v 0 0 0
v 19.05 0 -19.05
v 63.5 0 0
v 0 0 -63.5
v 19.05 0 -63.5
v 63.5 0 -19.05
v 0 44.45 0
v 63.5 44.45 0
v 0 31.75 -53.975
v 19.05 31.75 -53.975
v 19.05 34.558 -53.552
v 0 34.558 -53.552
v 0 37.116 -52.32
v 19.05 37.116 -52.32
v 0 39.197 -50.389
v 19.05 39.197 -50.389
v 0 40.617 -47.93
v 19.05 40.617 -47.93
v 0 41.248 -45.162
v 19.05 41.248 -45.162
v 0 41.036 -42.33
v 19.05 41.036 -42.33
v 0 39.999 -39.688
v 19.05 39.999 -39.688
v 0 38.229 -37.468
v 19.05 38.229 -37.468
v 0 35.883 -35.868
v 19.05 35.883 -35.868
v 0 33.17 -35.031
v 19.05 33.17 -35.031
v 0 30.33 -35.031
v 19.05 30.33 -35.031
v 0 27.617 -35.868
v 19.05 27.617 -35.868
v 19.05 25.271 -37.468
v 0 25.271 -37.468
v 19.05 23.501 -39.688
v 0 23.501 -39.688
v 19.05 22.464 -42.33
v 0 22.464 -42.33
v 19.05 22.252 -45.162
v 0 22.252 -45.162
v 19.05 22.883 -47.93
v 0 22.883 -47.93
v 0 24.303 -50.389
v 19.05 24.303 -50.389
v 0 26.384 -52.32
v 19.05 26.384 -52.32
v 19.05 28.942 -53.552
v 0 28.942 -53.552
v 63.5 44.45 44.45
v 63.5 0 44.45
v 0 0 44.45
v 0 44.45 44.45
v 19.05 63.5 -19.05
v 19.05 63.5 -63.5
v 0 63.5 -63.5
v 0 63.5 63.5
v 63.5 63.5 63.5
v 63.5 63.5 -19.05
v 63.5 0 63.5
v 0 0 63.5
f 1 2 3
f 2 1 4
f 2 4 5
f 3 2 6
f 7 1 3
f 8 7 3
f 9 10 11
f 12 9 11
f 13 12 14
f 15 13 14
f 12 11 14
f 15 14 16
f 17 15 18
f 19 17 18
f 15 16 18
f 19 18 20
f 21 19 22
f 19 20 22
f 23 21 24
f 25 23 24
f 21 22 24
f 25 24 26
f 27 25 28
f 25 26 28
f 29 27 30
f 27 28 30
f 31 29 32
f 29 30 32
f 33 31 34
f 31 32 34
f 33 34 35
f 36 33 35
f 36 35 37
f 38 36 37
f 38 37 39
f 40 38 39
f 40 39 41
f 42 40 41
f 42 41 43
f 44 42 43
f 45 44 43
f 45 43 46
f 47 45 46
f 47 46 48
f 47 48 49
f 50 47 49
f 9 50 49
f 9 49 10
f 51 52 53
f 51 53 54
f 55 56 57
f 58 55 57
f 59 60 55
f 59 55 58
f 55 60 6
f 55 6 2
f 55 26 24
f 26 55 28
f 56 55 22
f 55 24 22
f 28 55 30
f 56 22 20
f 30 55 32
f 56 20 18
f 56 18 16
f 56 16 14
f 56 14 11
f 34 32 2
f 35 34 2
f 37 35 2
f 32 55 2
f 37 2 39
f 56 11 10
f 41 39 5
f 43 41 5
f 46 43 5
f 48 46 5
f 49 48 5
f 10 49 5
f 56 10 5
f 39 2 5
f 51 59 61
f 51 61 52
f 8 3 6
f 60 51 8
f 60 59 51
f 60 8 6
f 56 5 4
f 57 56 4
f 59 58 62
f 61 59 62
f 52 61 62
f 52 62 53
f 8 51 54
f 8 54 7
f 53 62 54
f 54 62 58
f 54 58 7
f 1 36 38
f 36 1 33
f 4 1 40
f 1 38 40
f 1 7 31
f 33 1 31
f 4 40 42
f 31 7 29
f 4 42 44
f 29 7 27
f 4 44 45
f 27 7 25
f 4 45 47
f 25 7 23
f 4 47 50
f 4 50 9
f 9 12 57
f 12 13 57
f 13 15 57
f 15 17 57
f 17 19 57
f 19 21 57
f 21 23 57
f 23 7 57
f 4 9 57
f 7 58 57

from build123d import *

# Parameters (mm, degrees)
BOSS_EXTRUDE1_DEPTH = 63.5
BOSS_EXTRUDE2_DEPTH = 63.5
SKETCH6_R           = 9.525
CUT_EXTRUDE1_DEPTH  = 20.05


with BuildPart() as part:
    # Sketch3 → Boss-Extrude1 (new body)
    with BuildSketch(Plane(origin=(0, 0, 0), x_dir=(1, 0, 0), z_dir=(0, 1, 0))):
        Polygon((0, 0), (63.5, 0), (63.5, 19.05), (19.05, 19.05), (19.05, 63.5), (0, 63.5), align=None)
    extrude(amount=BOSS_EXTRUDE1_DEPTH)

    # Sketch5 → Boss-Extrude2 (add)
    with BuildSketch(Plane(origin=(63.5, 0, 0), x_dir=(0, 0, -1), z_dir=(1, 0, 0))):
        Polygon((0, 63.5), (-63.5, 63.5), (-63.5, 0), (-44.45, 0), (-44.45, 44.45), (0, 44.45), align=None)
    extrude(amount=-BOSS_EXTRUDE2_DEPTH)

    # Sketch6 → Cut-Extrude1 (cut, through all)
    with BuildSketch(Plane(origin=(19.05, 0, 0), x_dir=(0, 0, -1), z_dir=(1, 0, 0))):
        with Locations((44.45, 31.75)):
            Circle(SKETCH6_R)
    extrude(amount=-CUT_EXTRUDE1_DEPTH, mode=Mode.SUBTRACT)


solid = part.part
